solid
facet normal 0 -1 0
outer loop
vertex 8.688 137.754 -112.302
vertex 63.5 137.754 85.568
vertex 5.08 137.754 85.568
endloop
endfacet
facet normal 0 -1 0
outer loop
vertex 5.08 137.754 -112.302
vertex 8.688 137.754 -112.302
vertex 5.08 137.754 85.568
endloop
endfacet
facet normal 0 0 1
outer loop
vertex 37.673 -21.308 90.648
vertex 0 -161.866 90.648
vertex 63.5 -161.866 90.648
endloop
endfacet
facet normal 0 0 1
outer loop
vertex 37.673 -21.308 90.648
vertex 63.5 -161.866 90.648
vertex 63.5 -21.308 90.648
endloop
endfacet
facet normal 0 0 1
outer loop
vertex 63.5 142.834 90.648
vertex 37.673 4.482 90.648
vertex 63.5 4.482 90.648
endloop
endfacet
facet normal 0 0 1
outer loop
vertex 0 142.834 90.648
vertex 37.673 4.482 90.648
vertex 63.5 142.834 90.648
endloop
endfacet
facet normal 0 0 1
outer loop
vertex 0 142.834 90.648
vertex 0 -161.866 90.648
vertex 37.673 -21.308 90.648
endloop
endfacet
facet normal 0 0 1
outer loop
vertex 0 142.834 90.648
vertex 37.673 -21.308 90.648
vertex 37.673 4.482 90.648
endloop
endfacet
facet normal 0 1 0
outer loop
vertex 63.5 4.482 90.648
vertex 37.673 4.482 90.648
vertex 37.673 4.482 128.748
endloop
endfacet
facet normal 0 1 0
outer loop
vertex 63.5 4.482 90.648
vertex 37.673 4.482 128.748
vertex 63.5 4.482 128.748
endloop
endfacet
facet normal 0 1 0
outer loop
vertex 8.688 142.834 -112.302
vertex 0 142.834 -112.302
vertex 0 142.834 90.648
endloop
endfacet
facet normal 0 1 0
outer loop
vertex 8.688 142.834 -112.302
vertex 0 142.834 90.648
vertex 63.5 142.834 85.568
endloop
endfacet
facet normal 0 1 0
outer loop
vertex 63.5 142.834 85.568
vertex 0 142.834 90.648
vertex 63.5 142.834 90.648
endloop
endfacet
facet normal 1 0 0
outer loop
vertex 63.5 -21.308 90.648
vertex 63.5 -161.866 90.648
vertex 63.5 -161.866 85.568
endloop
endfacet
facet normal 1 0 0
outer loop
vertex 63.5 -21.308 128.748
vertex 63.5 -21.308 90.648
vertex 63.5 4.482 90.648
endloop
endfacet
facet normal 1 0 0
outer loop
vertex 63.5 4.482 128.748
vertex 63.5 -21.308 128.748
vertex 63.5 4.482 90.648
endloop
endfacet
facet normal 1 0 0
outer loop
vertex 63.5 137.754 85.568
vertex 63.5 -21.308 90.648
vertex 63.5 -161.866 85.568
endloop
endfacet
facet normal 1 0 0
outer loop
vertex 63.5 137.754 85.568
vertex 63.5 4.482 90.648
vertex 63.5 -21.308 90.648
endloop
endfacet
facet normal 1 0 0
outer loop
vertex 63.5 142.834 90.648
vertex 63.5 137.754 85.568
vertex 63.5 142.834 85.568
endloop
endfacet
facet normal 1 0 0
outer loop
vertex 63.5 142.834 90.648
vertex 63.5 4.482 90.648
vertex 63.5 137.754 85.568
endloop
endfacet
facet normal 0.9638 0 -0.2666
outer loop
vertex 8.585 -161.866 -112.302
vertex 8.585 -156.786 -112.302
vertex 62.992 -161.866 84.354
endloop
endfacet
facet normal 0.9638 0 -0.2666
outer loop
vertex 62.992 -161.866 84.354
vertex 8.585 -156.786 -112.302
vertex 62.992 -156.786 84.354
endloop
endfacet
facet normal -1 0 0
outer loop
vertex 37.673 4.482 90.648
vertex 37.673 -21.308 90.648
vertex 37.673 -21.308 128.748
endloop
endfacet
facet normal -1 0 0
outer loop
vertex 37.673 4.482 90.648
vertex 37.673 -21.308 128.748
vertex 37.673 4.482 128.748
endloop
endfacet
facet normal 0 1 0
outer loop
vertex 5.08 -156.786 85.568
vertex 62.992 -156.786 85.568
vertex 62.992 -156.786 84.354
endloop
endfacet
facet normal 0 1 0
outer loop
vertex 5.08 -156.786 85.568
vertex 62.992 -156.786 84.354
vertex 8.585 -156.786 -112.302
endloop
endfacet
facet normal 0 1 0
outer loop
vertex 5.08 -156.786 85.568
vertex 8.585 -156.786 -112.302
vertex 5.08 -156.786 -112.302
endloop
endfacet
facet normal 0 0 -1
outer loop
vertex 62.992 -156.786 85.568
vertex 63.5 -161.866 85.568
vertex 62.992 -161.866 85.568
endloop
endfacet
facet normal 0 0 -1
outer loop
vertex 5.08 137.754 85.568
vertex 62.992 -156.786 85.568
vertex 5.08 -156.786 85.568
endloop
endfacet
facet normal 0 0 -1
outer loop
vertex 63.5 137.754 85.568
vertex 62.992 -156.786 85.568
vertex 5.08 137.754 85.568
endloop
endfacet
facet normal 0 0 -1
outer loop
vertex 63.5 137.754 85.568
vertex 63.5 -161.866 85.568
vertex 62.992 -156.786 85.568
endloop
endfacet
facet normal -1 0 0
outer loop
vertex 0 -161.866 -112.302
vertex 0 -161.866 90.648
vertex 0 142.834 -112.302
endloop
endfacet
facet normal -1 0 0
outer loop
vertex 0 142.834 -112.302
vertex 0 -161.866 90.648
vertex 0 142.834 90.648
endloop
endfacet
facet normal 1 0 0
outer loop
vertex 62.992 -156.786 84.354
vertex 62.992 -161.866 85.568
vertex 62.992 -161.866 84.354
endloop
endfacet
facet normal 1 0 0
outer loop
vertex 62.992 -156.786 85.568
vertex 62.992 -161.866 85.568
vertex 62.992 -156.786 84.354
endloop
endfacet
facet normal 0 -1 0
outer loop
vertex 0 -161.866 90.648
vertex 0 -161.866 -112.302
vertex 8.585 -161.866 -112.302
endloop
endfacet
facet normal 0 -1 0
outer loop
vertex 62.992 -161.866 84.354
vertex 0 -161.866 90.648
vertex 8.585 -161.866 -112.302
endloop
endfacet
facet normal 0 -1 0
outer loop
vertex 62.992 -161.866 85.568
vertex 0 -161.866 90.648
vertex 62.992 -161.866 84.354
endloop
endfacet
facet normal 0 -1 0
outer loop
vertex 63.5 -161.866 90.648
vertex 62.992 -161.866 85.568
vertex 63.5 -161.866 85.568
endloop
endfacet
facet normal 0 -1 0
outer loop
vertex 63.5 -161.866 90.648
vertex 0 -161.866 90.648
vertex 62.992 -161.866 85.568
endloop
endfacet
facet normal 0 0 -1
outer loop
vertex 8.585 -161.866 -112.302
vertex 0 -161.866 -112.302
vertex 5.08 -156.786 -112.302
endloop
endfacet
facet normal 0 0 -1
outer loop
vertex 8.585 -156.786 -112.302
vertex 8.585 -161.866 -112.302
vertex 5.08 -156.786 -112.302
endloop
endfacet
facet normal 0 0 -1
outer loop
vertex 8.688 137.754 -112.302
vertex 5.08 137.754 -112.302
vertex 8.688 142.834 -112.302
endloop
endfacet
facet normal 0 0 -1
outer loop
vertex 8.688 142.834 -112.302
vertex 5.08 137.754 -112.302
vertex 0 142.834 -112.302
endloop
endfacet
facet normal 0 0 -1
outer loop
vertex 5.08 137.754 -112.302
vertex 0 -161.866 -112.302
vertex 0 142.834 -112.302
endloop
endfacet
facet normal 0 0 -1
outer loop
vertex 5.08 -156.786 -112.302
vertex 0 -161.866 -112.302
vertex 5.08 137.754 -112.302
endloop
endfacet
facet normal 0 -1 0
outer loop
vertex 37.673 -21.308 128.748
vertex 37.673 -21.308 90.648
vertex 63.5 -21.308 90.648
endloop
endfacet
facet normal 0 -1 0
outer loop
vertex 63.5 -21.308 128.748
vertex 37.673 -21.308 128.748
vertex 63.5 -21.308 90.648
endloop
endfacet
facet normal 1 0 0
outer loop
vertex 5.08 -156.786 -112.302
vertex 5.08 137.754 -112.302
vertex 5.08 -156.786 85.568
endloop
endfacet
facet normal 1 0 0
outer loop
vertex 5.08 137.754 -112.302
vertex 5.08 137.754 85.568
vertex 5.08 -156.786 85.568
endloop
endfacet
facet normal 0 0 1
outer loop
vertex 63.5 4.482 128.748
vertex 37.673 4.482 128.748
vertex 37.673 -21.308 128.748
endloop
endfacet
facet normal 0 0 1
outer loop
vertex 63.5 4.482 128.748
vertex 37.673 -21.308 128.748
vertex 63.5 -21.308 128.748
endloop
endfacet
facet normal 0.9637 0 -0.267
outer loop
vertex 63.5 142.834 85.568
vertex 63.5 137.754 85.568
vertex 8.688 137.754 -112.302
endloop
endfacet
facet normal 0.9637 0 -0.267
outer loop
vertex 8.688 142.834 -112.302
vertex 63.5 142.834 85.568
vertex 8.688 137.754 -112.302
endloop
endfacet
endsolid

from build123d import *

# Parameters (mm, degrees)
F0_W      = 304.7006875277
F0_H      = 202.9495164752
F1_DEPTH  = 63.5
F2_T      = -5.08
F3_DEPTH  = 25.4
F4_DEPTH  = 25.4
F7_DEPTH  = 123.952
F9_DEPTH  = 25.4
F10_W     = 5.08
F10_H     = 197.8695164752
F11_DEPTH = 0.508
F12_W     = 25.8265564442
F12_H     = 25.7899604912
F13_DEPTH = 38.1


with BuildPart() as f1:
    # F0 (on Right) → F1 (new body)
    with BuildSketch(Plane.YZ):
        with Locations((-9.5159932971, -10.8270607889)):
            Rectangle(F0_W, F0_H)
    extrude(amount=F1_DEPTH)

    # F2
    f2_openings = [f1.faces().sort_by_distance(p)[0] for p in [
        (63.5, -9.515993, -10.827061),
    ]]
    offset(amount=F2_T, openings=f2_openings)

    # F3 (cut): a face of the model
    f3_faces = [f1.faces().sort_by_distance(p)[0] for p in [
        (31.75, -9.5159932971, -112.3018190265),
    ]]
    extrude(f3_faces, amount=-F3_DEPTH, mode=Mode.SUBTRACT)

    # F4 (add): a face of the model
    f4_faces = [f1.faces().sort_by_distance(p)[0] for p in [
        (3.1124710277, -9.5159932971, -86.9018190265),
    ]]
    extrude(f4_faces, amount=F4_DEPTH)

    # F6 (on face) → F7 (cut)
    with BuildSketch(Plane.XZ.offset(-137.7543504667)):
        Polygon((63.5, -112.3018190265), (63.5, 85.5676974487), (8.6876470596, -112.3018190265), align=None)
    extrude(amount=-F7_DEPTH, mode=Mode.SUBTRACT)

    # F8 (on face) → F9 (cut)
    with BuildSketch(Plane(origin=(0, -156.7863370609, 0), x_dir=(-1, 0, 0), z_dir=(0, 1, 0))):
        Polygon((-8.4076998755, -112.942405045), (-63.1341859698, 84.8678573966), (-63.1341859698, -112.942405045), align=None)
    extrude(amount=-F9_DEPTH, mode=Mode.SUBTRACT)

    # F10 (on face) → F11 (cut)
    with BuildSketch(Plane.YZ.offset(63.5)):
        with Locations((-159.3263370609, -13.3670607889)):
            Rectangle(F10_W, F10_H)
    extrude(amount=-F11_DEPTH, mode=Mode.SUBTRACT)

    # F12 (on face) → F13 (join)
    with BuildSketch(Plane.XY.offset(90.6476974487)):
        with Locations((50.5867217779, -8.4131233307)):
            Rectangle(F12_W, F12_H)
    extrude(amount=F13_DEPTH)


solid = f1.part
